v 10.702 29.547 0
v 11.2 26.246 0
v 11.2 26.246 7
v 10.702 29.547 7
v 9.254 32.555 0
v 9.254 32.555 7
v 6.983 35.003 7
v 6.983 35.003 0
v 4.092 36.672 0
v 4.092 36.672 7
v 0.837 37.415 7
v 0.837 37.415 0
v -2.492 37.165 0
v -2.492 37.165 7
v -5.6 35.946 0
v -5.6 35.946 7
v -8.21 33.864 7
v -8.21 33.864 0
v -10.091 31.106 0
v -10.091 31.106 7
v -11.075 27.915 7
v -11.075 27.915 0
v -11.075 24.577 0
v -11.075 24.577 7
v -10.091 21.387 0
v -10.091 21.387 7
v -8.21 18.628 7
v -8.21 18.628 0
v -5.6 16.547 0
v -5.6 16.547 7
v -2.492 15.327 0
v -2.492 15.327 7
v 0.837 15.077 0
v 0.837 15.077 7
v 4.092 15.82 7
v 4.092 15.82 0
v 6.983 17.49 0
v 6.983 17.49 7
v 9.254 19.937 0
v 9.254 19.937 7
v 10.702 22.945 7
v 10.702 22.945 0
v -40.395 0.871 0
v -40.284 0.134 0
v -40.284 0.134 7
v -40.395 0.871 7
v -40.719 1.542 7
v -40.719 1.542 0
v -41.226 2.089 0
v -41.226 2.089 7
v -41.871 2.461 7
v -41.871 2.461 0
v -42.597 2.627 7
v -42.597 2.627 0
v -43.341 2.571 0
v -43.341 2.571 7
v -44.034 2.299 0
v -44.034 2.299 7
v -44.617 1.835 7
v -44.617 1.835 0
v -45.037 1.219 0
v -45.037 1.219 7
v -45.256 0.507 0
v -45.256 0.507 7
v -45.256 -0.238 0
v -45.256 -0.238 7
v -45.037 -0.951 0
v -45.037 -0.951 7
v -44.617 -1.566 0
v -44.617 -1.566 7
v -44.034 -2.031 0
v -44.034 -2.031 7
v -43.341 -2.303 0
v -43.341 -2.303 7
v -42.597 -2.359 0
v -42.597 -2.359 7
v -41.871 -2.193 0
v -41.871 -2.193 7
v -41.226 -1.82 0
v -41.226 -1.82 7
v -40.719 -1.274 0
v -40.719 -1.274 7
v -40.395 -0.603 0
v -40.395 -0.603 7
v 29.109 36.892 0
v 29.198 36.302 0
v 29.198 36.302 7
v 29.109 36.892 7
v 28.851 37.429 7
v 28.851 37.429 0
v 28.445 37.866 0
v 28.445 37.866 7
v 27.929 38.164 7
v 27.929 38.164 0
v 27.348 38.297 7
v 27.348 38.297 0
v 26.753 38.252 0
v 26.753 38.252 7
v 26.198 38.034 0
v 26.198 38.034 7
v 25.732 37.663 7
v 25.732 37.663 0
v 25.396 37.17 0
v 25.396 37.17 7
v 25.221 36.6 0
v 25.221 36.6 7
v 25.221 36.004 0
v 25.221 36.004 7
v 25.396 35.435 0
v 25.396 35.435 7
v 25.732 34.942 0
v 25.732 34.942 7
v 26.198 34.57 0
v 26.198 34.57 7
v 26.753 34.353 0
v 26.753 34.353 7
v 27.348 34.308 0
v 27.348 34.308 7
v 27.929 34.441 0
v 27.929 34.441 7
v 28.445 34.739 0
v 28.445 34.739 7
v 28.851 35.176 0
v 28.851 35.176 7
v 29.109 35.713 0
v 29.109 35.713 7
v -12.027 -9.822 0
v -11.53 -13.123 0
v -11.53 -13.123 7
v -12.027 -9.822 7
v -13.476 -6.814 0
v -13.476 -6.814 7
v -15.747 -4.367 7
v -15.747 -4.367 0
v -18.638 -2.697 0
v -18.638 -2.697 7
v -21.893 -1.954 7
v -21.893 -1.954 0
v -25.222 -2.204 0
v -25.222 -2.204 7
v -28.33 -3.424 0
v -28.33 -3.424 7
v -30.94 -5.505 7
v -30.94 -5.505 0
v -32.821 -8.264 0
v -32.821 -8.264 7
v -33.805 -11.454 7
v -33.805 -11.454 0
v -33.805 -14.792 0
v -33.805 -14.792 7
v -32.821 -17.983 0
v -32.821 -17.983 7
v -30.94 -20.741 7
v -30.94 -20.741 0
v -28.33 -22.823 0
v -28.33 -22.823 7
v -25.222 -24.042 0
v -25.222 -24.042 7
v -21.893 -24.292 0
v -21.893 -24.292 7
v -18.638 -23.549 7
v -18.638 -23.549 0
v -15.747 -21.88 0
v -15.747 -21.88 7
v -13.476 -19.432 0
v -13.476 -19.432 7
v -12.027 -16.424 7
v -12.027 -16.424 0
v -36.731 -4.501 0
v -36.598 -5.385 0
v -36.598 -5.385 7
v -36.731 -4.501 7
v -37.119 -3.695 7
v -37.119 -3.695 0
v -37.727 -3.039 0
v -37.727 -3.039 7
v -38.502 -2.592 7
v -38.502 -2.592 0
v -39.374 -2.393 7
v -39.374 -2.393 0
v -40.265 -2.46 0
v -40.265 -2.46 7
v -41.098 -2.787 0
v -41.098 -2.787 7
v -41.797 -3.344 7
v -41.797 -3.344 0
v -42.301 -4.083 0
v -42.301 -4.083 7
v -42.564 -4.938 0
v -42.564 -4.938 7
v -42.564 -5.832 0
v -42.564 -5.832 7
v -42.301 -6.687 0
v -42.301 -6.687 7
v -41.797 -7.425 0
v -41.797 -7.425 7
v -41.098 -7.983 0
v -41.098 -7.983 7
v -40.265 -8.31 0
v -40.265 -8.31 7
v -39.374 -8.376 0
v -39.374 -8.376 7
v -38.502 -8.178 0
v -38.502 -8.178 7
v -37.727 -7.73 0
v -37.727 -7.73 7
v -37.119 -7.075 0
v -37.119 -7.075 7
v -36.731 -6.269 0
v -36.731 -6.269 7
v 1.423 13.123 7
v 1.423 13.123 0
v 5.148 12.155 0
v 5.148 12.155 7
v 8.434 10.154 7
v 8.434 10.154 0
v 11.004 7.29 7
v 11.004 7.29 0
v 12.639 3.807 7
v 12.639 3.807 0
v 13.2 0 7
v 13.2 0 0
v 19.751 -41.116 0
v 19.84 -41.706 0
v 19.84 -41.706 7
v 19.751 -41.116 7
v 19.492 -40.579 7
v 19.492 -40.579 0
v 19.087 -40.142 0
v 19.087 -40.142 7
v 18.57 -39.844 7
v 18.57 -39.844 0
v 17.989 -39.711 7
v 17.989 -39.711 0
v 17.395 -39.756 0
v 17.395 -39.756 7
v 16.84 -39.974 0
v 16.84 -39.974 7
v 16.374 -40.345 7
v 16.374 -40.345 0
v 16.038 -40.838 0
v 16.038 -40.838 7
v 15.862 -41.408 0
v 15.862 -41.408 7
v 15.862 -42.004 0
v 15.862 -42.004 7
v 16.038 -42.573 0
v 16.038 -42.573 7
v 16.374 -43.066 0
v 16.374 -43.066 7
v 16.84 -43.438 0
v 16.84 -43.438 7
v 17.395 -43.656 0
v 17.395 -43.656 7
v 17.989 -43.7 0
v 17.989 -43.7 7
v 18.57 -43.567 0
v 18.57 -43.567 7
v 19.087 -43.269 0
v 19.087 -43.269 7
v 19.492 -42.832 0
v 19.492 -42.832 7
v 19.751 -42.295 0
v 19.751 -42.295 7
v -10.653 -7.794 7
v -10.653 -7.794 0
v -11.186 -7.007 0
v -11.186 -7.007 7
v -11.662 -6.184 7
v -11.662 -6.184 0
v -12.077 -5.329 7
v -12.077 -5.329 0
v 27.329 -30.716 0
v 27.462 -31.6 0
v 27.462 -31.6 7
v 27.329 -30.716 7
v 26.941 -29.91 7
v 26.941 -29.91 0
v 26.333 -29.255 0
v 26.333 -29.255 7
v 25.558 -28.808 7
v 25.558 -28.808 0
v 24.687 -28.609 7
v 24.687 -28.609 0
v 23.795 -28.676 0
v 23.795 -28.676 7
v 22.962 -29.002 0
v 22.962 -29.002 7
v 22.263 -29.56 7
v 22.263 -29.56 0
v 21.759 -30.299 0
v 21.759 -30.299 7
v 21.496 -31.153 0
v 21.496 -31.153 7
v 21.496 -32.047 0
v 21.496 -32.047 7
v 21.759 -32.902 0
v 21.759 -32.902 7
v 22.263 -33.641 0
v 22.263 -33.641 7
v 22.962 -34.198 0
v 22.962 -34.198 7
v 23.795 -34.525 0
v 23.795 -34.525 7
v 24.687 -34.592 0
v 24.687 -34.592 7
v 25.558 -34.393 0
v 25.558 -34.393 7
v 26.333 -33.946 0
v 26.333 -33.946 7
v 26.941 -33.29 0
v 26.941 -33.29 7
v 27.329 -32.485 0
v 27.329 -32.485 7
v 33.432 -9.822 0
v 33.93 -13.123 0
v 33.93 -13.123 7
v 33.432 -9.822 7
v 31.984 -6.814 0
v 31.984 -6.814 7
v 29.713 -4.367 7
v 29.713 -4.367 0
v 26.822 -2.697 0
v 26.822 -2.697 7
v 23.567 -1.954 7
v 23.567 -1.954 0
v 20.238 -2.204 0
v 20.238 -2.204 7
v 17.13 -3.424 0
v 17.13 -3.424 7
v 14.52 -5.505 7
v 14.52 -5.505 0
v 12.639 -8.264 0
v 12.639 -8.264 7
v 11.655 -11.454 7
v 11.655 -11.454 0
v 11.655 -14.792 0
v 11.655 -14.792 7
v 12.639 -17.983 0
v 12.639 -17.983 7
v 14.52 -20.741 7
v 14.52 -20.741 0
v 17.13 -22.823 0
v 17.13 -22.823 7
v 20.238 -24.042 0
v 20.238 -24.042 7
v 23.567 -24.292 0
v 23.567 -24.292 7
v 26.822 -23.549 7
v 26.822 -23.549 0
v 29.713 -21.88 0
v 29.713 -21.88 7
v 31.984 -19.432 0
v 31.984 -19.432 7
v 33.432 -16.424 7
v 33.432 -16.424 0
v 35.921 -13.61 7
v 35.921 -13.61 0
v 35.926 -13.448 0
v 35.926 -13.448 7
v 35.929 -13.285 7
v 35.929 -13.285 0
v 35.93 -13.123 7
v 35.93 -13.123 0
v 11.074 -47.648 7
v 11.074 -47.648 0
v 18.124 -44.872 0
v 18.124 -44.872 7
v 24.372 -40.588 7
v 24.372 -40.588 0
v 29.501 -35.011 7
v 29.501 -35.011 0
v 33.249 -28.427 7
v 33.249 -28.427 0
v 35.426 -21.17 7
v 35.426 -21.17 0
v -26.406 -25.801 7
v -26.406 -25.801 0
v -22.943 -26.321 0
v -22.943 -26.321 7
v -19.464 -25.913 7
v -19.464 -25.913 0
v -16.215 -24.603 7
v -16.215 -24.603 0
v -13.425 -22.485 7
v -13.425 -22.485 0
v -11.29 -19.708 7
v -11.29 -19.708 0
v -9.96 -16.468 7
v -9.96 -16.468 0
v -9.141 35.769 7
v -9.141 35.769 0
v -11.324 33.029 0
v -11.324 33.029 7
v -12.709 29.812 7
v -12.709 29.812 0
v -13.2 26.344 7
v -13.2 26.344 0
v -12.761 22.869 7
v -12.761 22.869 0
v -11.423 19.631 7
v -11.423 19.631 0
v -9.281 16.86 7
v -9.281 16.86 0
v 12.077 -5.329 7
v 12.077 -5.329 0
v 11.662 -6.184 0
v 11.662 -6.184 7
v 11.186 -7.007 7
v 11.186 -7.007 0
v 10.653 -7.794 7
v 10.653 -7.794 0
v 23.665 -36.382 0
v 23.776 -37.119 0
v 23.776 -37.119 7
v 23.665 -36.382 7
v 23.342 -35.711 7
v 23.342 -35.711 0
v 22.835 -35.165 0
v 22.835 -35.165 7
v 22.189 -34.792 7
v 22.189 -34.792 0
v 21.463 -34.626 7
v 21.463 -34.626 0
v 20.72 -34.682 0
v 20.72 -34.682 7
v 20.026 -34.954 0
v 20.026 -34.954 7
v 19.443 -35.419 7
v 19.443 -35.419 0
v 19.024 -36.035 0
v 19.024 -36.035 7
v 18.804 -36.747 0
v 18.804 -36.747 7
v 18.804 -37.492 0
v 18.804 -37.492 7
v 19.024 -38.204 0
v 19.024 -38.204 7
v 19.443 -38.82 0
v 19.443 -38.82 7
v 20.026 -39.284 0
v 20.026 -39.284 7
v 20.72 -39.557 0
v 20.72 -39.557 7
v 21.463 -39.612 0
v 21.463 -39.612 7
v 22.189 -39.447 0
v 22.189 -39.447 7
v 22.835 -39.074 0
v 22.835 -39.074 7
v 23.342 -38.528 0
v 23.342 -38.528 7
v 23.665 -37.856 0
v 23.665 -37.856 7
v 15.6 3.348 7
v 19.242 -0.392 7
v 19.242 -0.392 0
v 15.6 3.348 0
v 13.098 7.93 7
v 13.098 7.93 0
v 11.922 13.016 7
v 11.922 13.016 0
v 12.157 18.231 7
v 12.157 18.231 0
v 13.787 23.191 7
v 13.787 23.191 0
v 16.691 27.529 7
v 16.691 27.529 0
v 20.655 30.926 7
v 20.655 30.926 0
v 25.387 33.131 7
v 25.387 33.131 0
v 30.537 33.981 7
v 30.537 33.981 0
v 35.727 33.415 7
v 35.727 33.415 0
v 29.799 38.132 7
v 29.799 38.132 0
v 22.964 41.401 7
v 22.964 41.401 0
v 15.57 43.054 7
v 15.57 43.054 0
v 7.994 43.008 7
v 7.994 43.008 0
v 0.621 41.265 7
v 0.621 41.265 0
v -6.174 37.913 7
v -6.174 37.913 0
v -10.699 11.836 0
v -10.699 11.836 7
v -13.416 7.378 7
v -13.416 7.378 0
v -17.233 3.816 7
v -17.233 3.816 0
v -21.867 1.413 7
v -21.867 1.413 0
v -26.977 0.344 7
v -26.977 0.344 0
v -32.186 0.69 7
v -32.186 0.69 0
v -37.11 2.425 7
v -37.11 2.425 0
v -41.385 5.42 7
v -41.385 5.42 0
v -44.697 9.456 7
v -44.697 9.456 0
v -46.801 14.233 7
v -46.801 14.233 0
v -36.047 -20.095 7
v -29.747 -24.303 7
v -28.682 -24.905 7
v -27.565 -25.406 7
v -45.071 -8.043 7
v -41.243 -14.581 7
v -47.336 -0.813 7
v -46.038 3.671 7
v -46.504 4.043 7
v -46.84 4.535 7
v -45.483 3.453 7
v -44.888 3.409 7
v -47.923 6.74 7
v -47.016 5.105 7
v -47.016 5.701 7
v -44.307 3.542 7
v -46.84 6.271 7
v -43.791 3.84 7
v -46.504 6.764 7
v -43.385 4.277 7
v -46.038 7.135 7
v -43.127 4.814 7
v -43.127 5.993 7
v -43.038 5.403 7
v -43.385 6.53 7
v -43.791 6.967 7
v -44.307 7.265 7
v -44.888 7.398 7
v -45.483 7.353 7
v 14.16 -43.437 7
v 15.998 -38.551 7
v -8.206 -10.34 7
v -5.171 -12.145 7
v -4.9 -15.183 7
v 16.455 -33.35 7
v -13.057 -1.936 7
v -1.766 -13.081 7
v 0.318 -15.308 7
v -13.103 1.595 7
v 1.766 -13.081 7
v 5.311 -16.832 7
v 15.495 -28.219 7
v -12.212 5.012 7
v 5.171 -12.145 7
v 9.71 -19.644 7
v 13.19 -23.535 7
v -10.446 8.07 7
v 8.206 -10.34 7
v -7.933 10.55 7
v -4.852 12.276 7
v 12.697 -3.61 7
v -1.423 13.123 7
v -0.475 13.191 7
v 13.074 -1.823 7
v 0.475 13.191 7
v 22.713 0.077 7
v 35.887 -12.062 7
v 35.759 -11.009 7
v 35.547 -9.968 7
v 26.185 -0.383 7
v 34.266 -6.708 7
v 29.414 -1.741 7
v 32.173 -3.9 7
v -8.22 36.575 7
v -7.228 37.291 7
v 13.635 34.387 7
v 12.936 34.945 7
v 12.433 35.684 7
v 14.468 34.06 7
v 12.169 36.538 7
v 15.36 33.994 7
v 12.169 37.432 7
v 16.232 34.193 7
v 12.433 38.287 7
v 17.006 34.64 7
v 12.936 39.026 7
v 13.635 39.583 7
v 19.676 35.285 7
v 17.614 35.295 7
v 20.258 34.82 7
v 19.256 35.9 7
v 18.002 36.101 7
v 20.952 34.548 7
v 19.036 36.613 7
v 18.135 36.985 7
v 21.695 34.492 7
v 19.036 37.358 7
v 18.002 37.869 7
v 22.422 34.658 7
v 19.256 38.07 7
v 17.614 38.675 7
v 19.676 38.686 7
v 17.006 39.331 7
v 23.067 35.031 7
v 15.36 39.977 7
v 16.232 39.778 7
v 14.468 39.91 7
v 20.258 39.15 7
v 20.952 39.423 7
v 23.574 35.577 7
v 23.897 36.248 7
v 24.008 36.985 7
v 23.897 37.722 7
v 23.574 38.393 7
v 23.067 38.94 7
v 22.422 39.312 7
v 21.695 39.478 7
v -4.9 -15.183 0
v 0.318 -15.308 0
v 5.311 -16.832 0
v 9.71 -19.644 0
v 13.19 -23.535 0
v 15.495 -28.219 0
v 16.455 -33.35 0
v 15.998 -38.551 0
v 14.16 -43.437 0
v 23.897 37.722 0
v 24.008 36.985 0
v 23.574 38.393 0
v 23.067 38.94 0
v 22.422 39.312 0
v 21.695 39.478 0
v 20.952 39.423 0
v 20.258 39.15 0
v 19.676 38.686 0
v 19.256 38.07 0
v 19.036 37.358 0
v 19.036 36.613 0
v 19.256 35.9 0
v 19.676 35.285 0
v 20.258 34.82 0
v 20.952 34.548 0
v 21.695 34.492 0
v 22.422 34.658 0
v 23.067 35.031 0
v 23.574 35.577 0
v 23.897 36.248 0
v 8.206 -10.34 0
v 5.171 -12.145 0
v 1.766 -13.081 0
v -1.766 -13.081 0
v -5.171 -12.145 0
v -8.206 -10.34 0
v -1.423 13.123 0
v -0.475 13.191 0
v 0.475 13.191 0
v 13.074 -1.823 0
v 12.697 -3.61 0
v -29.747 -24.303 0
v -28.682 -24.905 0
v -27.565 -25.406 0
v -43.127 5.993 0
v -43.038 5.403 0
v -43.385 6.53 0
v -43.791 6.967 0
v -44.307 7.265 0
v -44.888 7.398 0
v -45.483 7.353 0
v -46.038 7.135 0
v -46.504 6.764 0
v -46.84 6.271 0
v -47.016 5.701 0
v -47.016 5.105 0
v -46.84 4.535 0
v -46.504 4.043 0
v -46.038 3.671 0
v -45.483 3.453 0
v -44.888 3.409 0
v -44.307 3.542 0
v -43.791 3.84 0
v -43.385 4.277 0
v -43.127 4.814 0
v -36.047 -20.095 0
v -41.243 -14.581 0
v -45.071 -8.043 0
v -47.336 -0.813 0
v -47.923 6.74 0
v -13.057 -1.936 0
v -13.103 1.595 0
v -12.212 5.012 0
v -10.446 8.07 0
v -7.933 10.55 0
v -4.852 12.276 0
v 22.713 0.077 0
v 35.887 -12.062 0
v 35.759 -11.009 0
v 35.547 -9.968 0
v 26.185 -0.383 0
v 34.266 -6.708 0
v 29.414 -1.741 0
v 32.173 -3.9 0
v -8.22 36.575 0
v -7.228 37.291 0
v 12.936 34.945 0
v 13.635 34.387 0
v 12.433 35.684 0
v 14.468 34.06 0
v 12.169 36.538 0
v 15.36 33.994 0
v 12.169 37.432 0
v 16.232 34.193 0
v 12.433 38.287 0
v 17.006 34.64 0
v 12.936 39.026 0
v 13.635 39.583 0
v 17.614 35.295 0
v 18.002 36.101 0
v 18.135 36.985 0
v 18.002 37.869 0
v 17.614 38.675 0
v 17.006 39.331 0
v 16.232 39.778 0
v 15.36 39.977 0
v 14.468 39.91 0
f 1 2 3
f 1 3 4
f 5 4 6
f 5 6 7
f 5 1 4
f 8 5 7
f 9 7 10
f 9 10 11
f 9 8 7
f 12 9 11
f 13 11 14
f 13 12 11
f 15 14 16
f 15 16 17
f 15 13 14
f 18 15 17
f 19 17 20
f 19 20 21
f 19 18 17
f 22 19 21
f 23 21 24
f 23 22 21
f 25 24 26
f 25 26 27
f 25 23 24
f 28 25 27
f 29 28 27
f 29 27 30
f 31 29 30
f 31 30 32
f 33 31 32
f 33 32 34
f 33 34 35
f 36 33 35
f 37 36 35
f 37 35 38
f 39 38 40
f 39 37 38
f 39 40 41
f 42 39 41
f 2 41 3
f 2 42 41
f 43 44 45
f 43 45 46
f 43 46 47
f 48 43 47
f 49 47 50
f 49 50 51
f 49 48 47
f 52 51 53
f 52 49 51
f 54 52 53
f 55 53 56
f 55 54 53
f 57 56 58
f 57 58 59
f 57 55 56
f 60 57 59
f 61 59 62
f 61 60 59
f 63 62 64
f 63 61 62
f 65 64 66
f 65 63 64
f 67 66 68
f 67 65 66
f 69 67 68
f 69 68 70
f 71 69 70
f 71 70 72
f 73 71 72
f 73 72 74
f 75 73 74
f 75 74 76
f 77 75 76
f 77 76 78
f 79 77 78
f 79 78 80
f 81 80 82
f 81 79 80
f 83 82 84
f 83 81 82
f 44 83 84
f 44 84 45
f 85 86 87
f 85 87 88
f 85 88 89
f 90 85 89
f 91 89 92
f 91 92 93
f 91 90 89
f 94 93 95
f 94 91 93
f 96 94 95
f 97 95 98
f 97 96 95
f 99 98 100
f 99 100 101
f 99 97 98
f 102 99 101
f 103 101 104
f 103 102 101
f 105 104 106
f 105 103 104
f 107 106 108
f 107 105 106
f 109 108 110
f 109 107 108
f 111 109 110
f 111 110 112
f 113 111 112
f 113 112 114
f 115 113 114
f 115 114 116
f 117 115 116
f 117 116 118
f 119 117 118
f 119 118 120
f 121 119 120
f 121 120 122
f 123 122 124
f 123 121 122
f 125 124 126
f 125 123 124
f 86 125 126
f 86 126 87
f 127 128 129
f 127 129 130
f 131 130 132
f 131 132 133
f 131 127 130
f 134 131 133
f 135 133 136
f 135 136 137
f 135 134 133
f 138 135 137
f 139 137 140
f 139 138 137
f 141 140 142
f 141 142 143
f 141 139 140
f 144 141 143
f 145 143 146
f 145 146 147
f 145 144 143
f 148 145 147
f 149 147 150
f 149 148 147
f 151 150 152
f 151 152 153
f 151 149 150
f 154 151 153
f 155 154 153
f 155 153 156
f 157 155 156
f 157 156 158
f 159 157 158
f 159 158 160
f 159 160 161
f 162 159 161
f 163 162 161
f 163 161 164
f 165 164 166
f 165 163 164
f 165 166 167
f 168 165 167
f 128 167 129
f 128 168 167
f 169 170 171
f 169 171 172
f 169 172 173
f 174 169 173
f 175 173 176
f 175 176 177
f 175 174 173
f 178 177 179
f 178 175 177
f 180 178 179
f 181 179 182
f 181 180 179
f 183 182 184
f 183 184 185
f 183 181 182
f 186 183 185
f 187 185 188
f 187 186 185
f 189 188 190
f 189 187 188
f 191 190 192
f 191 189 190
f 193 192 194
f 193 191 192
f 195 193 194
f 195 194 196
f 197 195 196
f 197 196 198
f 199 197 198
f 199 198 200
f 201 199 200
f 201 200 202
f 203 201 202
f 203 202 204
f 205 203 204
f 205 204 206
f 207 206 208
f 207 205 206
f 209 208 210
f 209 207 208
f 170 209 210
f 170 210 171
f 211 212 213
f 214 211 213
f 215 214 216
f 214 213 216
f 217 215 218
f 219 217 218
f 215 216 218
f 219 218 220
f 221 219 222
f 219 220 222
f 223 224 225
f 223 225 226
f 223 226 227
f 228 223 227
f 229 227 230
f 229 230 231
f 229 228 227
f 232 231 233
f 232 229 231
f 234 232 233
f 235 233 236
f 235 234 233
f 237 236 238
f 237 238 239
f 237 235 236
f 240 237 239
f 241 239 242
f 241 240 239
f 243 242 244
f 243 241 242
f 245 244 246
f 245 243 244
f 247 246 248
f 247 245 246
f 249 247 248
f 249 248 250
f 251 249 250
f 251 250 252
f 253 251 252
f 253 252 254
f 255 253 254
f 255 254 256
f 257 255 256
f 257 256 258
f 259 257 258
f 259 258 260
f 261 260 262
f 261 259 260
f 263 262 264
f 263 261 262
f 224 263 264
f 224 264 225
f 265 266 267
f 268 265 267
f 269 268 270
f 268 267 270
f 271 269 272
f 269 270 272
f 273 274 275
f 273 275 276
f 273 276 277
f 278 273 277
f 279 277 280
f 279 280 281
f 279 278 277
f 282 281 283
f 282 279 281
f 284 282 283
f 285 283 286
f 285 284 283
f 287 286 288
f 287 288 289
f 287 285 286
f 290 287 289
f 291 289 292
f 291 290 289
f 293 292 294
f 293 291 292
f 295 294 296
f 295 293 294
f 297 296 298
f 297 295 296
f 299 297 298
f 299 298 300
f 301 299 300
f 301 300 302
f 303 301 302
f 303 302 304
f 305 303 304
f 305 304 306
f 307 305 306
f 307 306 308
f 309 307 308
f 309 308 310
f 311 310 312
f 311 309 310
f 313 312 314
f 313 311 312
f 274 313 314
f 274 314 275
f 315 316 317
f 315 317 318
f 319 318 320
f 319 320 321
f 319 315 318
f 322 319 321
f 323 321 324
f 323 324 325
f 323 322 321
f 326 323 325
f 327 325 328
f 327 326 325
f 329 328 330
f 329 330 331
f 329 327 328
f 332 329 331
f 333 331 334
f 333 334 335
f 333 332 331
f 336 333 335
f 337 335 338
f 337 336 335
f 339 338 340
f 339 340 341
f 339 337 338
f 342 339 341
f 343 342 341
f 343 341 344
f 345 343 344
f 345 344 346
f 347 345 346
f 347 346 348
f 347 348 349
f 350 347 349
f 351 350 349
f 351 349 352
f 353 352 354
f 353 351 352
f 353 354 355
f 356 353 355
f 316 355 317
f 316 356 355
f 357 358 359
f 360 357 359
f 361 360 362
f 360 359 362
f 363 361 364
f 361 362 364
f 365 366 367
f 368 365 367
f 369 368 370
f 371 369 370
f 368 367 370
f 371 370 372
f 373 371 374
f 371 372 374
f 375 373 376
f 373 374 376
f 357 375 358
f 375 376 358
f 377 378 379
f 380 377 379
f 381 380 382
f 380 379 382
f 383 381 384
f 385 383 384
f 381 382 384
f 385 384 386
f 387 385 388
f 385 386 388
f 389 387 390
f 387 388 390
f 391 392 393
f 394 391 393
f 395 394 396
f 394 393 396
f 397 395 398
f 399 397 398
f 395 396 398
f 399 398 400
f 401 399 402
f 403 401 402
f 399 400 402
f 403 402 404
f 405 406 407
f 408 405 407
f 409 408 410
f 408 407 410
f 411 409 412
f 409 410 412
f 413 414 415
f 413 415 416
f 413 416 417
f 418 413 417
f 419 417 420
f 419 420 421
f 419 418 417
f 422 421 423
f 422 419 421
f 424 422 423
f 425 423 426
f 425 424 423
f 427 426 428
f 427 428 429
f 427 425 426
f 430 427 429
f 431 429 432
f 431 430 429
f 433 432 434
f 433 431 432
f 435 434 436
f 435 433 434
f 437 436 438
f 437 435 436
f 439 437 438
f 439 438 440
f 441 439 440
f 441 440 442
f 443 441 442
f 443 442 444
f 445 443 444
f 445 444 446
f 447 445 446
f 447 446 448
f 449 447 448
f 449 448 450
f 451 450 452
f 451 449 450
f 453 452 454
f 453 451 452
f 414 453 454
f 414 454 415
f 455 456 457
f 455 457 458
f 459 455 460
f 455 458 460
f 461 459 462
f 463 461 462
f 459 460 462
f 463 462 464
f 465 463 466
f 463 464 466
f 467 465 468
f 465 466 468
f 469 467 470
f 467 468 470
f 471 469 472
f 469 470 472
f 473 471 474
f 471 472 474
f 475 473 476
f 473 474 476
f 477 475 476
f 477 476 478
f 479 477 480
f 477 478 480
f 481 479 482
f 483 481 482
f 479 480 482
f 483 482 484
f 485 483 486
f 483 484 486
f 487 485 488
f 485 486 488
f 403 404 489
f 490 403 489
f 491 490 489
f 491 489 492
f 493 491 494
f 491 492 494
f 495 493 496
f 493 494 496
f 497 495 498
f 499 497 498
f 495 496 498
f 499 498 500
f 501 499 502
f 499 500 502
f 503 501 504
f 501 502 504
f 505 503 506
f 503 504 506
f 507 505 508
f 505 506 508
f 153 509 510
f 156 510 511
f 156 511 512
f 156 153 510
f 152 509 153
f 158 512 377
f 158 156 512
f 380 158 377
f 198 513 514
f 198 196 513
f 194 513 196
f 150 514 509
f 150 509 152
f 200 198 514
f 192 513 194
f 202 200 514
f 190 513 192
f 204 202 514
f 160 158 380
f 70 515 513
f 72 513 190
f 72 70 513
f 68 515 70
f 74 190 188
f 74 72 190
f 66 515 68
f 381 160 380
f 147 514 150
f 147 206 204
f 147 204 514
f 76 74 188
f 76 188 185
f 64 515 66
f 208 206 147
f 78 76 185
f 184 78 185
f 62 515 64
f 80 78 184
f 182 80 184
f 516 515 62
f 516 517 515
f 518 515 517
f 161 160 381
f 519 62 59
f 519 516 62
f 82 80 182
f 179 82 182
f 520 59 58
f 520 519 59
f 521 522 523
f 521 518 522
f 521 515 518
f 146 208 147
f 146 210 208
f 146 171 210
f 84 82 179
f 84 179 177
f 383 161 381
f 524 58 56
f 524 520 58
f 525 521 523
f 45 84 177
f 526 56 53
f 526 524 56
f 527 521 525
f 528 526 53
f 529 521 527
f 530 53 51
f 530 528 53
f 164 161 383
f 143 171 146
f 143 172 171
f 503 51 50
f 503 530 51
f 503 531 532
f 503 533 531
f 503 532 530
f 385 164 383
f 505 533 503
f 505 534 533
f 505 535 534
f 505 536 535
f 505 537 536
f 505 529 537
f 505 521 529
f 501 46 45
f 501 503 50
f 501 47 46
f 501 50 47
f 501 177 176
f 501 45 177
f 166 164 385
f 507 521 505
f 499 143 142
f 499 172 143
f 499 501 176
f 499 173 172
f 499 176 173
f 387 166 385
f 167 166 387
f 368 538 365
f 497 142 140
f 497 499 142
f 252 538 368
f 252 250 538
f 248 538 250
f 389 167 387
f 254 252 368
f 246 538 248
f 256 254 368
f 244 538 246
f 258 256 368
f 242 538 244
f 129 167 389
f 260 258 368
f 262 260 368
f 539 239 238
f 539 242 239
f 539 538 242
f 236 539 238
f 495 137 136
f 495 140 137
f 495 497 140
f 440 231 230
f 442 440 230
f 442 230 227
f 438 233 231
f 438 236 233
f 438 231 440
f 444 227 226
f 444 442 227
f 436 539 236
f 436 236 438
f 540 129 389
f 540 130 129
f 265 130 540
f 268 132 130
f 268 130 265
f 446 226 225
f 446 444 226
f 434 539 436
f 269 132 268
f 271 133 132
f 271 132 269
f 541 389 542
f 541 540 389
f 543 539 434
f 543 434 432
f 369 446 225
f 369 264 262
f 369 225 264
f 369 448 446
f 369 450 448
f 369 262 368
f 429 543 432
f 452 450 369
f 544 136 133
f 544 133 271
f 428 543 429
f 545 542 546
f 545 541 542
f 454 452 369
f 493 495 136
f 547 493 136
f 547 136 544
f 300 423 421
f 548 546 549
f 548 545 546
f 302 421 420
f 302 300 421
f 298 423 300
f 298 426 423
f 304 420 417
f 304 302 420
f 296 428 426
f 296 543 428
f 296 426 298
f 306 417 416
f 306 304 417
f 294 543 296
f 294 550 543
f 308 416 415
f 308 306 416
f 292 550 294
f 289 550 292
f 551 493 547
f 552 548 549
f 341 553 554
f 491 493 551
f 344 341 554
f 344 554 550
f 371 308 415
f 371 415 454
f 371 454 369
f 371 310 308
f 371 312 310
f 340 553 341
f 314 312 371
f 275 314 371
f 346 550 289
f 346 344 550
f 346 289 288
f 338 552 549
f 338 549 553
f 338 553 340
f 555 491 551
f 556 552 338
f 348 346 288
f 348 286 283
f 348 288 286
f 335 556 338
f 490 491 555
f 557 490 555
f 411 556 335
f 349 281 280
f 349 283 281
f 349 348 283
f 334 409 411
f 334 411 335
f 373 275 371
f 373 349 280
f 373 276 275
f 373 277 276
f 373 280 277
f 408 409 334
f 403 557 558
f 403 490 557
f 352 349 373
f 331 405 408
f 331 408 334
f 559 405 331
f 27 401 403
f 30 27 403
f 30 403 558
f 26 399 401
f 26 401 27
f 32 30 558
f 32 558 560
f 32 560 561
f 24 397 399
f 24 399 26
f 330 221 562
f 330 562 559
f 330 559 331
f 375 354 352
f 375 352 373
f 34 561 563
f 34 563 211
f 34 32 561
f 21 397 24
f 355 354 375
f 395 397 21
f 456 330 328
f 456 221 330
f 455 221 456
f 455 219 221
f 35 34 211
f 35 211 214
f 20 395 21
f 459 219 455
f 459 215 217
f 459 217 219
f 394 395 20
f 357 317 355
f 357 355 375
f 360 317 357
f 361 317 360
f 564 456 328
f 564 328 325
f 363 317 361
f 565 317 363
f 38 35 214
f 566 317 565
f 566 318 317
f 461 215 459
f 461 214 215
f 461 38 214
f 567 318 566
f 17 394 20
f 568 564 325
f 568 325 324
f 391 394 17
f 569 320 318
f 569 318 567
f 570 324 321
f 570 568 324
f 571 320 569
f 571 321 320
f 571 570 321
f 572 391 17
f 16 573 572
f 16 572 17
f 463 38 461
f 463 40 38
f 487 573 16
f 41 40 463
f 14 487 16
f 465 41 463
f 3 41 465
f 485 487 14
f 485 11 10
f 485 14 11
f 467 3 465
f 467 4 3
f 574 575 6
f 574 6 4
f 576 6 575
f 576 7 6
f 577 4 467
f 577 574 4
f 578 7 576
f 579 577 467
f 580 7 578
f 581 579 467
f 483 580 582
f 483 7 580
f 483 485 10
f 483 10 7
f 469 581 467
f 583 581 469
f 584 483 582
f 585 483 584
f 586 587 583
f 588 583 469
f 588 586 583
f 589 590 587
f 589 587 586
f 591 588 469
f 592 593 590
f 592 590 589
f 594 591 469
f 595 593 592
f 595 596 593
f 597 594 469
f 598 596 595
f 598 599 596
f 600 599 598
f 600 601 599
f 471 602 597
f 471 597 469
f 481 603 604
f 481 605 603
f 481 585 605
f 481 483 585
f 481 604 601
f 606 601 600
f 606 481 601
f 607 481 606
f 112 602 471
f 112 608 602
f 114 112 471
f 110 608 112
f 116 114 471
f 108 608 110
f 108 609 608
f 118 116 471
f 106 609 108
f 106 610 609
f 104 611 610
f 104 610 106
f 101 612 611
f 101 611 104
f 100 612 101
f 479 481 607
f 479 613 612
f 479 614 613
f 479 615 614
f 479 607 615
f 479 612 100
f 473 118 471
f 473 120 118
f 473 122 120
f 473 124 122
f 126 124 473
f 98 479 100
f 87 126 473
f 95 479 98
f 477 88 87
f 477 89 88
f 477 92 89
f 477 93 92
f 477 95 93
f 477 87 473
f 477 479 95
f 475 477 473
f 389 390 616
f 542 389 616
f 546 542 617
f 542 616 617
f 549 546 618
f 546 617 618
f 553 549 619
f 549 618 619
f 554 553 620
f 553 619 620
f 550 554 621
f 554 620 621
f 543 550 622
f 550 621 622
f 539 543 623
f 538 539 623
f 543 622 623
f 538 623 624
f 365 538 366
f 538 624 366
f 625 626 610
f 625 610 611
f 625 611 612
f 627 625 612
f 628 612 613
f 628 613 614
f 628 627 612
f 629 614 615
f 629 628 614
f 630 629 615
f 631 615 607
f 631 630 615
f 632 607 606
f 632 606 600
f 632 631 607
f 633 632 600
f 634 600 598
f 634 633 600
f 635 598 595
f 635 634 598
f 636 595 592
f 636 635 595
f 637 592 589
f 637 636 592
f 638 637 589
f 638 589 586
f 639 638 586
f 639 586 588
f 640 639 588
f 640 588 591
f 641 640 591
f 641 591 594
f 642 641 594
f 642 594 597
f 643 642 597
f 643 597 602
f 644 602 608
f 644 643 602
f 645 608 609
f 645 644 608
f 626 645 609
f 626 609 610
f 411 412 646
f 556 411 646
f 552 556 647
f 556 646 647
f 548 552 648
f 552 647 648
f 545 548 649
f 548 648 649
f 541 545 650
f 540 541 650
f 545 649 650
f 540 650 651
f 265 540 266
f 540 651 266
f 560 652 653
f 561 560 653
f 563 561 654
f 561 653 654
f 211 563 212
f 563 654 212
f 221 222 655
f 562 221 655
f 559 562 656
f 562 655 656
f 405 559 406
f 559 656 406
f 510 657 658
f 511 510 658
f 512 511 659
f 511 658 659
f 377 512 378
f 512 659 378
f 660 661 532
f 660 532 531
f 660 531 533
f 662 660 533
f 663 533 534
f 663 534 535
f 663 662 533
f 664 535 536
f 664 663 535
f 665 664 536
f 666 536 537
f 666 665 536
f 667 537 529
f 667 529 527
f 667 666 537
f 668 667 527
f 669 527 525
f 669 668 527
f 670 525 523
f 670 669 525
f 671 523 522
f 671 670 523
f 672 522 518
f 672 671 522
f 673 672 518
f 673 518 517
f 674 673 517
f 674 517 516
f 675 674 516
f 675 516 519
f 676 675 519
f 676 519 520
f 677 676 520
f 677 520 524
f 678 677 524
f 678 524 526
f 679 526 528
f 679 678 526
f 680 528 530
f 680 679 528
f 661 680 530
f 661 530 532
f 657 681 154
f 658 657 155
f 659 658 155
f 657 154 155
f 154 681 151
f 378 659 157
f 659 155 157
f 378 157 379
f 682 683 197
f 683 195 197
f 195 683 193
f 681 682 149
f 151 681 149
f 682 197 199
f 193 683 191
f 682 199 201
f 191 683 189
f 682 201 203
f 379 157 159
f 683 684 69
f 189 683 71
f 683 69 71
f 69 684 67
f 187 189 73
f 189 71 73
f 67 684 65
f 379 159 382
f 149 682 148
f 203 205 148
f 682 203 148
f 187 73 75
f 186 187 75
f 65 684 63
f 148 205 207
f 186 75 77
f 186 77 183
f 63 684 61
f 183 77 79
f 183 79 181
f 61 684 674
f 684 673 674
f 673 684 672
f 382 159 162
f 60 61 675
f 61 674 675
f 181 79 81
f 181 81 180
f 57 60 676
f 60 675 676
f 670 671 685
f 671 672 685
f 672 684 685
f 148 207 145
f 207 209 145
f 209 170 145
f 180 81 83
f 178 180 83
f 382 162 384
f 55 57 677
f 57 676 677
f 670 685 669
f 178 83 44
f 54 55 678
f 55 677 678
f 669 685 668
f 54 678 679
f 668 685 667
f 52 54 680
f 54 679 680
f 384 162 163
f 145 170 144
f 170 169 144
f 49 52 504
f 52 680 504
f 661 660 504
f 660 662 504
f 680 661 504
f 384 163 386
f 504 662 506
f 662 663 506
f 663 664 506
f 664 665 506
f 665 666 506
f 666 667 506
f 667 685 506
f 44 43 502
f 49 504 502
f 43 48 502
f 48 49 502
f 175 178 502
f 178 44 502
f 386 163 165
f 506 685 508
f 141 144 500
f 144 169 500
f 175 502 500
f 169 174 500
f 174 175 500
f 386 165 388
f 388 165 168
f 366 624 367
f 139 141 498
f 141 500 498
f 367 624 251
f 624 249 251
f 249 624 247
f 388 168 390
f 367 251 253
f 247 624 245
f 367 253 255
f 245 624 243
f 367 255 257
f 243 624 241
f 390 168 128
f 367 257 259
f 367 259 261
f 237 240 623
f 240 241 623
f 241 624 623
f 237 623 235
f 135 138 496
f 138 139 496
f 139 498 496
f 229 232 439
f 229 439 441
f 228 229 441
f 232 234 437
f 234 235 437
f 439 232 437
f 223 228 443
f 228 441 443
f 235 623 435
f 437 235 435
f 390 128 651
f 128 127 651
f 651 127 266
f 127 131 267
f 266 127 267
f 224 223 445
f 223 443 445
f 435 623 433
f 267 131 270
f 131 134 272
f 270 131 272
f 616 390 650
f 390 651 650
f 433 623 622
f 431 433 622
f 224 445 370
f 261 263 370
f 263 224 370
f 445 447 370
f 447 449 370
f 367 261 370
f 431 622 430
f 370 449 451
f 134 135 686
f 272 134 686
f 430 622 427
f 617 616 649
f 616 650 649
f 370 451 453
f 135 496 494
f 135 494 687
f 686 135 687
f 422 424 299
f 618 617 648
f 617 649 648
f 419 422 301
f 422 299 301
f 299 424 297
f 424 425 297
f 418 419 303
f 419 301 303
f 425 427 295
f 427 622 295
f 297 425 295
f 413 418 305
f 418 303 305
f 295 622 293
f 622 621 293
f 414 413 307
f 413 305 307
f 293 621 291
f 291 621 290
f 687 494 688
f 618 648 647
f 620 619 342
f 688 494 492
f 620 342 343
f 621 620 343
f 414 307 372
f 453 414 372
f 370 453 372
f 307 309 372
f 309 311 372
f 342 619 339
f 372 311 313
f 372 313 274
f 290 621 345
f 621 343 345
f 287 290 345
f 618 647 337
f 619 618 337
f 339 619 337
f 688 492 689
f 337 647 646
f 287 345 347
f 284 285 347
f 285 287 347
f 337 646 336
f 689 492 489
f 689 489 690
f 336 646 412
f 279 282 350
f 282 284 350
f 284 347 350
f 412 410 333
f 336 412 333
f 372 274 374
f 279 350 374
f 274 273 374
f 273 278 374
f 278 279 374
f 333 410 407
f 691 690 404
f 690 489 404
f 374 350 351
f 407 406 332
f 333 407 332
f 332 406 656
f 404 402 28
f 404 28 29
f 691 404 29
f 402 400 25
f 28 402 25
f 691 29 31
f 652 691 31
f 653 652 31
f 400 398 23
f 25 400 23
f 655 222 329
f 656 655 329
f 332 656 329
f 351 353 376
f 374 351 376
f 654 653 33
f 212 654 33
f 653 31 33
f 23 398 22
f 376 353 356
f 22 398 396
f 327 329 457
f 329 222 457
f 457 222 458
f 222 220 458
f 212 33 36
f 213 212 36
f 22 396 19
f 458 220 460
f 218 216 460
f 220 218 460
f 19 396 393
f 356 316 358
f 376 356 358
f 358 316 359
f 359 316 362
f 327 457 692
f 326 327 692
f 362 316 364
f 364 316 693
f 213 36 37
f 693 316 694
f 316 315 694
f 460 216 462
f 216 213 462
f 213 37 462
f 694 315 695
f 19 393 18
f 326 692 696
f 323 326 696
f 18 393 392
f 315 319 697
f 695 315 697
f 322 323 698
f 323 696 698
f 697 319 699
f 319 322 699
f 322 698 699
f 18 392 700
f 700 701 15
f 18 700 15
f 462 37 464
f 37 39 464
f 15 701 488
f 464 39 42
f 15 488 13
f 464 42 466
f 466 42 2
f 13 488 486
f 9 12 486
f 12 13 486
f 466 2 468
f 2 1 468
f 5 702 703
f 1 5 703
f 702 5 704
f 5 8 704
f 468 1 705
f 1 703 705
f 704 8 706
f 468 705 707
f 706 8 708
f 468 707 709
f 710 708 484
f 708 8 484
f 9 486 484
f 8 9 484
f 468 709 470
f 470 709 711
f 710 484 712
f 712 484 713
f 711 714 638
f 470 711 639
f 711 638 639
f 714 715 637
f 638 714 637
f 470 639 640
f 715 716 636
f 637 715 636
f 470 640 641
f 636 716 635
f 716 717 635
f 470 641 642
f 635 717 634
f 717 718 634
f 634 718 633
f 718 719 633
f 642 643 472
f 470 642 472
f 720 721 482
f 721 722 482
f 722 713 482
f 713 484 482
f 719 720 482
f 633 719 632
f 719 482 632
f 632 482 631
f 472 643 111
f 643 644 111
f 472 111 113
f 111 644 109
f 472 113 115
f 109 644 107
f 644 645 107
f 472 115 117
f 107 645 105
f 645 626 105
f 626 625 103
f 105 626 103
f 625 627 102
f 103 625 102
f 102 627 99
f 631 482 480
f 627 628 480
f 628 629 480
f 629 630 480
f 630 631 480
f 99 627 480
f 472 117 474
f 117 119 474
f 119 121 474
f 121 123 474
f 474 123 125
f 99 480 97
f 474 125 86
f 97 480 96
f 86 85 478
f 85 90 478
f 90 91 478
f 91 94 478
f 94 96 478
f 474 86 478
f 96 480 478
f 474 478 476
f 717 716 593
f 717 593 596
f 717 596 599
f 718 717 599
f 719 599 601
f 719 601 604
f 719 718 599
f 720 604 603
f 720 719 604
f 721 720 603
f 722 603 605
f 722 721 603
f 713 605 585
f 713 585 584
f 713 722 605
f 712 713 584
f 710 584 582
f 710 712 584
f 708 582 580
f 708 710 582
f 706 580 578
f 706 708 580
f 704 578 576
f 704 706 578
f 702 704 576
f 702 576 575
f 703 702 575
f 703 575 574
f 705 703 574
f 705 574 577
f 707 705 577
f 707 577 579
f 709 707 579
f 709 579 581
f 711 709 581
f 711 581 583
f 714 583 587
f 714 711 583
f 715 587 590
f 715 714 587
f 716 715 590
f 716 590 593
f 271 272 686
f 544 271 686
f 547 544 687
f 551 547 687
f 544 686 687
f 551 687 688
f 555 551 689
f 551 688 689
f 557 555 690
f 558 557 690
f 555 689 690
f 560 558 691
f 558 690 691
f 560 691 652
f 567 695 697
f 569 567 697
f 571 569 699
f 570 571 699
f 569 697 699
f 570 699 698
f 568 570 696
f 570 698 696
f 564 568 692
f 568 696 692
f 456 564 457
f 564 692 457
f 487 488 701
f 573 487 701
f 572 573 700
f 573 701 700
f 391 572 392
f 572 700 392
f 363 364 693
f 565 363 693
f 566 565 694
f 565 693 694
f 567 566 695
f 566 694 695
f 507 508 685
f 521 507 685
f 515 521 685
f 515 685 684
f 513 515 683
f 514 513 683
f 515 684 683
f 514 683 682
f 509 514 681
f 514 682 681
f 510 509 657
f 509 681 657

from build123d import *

# Parameters (mm, degrees)
F0_R     = 11.2
F0_R_2   = 3
F0_R_3   = 2.5
F0_R_4   = 2
F1_DEPTH = 7


# Not quite as in the source:
# - a feature names something its author has since deleted; it is built from what else it names


with BuildPart() as f1:
    # F0 (on Top) → F1 (new body)
    with BuildSketch(Plane.XY):
        with BuildLine():
            ThreePointArc((-6.1736201838, 37.9133765769), (-7.7319005407, 36.9445453014), (-9.1407759551, 35.7689851037))
            ThreePointArc((-9.1407759551, 35.7689851037), (-7.6864399565, 36.8816423115), (-6.1736201838, 37.9133765769))
        make_face()
        with BuildLine():
            ThreePointArc((-26.4064617899, -25.8006367392), (-28.0972191968, -25.0974734227), (-29.7471371669, -24.3032002009))
            ThreePointArc((-29.7471371669, -24.3032002009), (-28.1289644919, -25.1682949385), (-26.4064617899, -25.8006367392))
        make_face()
        with BuildLine():
            ThreePointArc((35.929749598, -13.123027049), (35.8337727119, -11.5341349098), (35.5472377449, -9.9683483645))
            ThreePointArc((35.5472377449, -9.9683483645), (35.7836591533, -11.7841688888), (35.9207573507, -13.610176376))
            ThreePointArc((35.9207573507, -13.610176376), (35.9275013447, -13.3666432057), (35.929749598, -13.123027049))
        make_face()
        with BuildLine():
            ThreePointArc((-6.1736201838, 37.9133765769), (-7.6864399565, 36.8816423115), (-9.1407759551, 35.7689851037))
            ThreePointArc((-9.1407759551, 35.7689851037), (-13.1996365954, 26.3440017791), (-9.2810910796, 16.8598222464))
            ThreePointArc((-9.2810910796, 16.8598222464), (-5.669005002, 14.3253837189), (-1.4234328474, 13.123027049))
            ThreePointArc((-1.4234328474, 13.123027049), (0, 13.2), (1.4234328474, 13.123027049))
            ThreePointArc((1.4234328474, 13.123027049), (9.824187335, 17.4298563231), (13.2, 26.246054098))
            ThreePointArc((13.2, 26.246054098), (6.8098536539, 37.5538343052), (-6.1736201838, 37.9133765769))
        make_face()
        with Locations((0, 26.246054098)):
            Circle(F0_R, mode=Mode.SUBTRACT)
        with BuildLine():
            ThreePointArc((-10.6531583753, -7.7942425309), (-11.43153533, -6.6), (-12.0765912227, -5.3287845181))
            ThreePointArc((-12.0765912227, -5.3287845181), (-32.389553942, -4.1270179319), (-29.7471371669, -24.3032002009))
            ThreePointArc((-29.7471371669, -24.3032002009), (-28.0972191968, -25.0974734227), (-26.4064617899, -25.8006367392))
            ThreePointArc((-26.4064617899, -25.8006367392), (-16.2147564803, -24.6032215019), (-9.9604888289, -16.467571773))
            ThreePointArc((-9.9604888289, -16.467571773), (-9.6378772691, -14.8091109508), (-9.529749598, -13.123027049))
            ThreePointArc((-9.529749598, -13.123027049), (-9.8136549069, -10.4000694786), (-10.6531583753, -7.7942425309))
        make_face()
        with Locations((-22.729749598, -13.123027049)):
            Circle(F0_R, mode=Mode.SUBTRACT)
        with BuildLine():
            ThreePointArc((35.5472377449, -9.9683483645), (29.4143930758, -1.7407802772), (19.2415799085, -0.3922504734))
            ThreePointArc((19.2415799085, -0.3922504734), (15.2406487206, -2.2531895135), (12.0765912227, -5.3287845181))
            ThreePointArc((12.0765912227, -5.3287845181), (11.43153533, -6.6), (10.6531583753, -7.7942425309))
            ThreePointArc((10.6531583753, -7.7942425309), (19.7688793419, -25.9866675651), (35.9207573507, -13.610176376))
            ThreePointArc((35.9207573507, -13.610176376), (35.7836591533, -11.7841688888), (35.5472377449, -9.9683483645))
        make_face()
        with Locations((22.729749598, -13.123027049)):
            Circle(F0_R, mode=Mode.SUBTRACT)
        with BuildLine():
            ThreePointArc((-1.4234328474, 13.123027049), (-5.669005002, 14.3253837189), (-9.2810910796, 16.8598222464))
            ThreePointArc((-9.2810910796, 16.8598222464), (-26.9770057804, 0.3443606169), (-46.801379663, 14.2332075847))
            ThreePointArc((-46.801379663, 14.2332075847), (-45.0709674202, -8.0428719823), (-29.7471371669, -24.3032002009))
            ThreePointArc((-29.7471371669, -24.3032002009), (-32.389553942, -4.1270179319), (-12.0765912227, -5.3287845181))
            ThreePointArc((-12.0765912227, -5.3287845181), (-11.43153533, 6.6), (-1.4234328474, 13.123027049))
        make_face()
        with Locations((-39.597851646, -5.3848865237)):
            Circle(F0_R_2, mode=Mode.SUBTRACT)
        with Locations((-42.7842679926, 0.1341484827)):
            Circle(F0_R_3, mode=Mode.SUBTRACT)
        with Locations((-45.0379561931, 5.4032604173)):
            Circle(F0_R_4, mode=Mode.SUBTRACT)
        with BuildLine():
            ThreePointArc((35.7270091772, 33.4145799279), (15.570152254, 43.0540387502), (-6.1736201838, 37.9133765769))
            ThreePointArc((-6.1736201838, 37.9133765769), (6.8098536539, 37.5538343052), (13.2, 26.246054098))
            ThreePointArc((13.2, 26.246054098), (9.824187335, 17.4298563231), (1.4234328474, 13.123027049))
            ThreePointArc((1.4234328474, 13.123027049), (9.824187335, 8.816197775), (13.2, 0))
            ThreePointArc((13.2, 0), (12.9160946911, -2.7229575704), (12.0765912227, -5.3287845181))
            ThreePointArc((12.0765912227, -5.3287845181), (15.2406487206, -2.2531895135), (19.2415799085, -0.3922504734))
            ThreePointArc((19.2415799085, -0.3922504734), (13.7867279325, 23.1905920154), (35.7270091772, 33.4145799279))
        make_face()
        with Locations((15.135477297, 36.9851887226)):
            Circle(F0_R_2, mode=Mode.SUBTRACT)
        with Locations((21.5083099902, 36.9851887226)):
            Circle(F0_R_3, mode=Mode.SUBTRACT)
        with Locations((27.1983388811, 36.3023839891)):
            Circle(F0_R_4, mode=Mode.SUBTRACT)
        with BuildLine():
            ThreePointArc((10.6531583753, -7.7942425309), (0, -13.2), (-10.6531583753, -7.7942425309))
            ThreePointArc((-10.6531583753, -7.7942425309), (-9.8136549069, -10.4000694786), (-9.529749598, -13.123027049))
            ThreePointArc((-9.529749598, -13.123027049), (-9.6378772691, -14.8091109508), (-9.9604888289, -16.467571773))
            ThreePointArc((-9.9604888289, -16.467571773), (13.1902778479, -23.5349526323), (11.0743704858, -47.6477875127))
            ThreePointArc((11.0743704858, -47.6477875127), (29.5008151662, -35.0111667679), (35.9207573507, -13.610176376))
            ThreePointArc((35.9207573507, -13.610176376), (19.7688793419, -25.9866675651), (10.6531583753, -7.7942425309))
        make_face()
        with Locations((17.8396173119, -41.7056444063)):
            Circle(F0_R_4, mode=Mode.SUBTRACT)
        with Locations((21.2759580025, -37.1193372053)):
            Circle(F0_R_3, mode=Mode.SUBTRACT)
        with Locations((24.462374349, -31.6003021989)):
            Circle(F0_R_2, mode=Mode.SUBTRACT)
    extrude(amount=F1_DEPTH)


solid = f1.part
